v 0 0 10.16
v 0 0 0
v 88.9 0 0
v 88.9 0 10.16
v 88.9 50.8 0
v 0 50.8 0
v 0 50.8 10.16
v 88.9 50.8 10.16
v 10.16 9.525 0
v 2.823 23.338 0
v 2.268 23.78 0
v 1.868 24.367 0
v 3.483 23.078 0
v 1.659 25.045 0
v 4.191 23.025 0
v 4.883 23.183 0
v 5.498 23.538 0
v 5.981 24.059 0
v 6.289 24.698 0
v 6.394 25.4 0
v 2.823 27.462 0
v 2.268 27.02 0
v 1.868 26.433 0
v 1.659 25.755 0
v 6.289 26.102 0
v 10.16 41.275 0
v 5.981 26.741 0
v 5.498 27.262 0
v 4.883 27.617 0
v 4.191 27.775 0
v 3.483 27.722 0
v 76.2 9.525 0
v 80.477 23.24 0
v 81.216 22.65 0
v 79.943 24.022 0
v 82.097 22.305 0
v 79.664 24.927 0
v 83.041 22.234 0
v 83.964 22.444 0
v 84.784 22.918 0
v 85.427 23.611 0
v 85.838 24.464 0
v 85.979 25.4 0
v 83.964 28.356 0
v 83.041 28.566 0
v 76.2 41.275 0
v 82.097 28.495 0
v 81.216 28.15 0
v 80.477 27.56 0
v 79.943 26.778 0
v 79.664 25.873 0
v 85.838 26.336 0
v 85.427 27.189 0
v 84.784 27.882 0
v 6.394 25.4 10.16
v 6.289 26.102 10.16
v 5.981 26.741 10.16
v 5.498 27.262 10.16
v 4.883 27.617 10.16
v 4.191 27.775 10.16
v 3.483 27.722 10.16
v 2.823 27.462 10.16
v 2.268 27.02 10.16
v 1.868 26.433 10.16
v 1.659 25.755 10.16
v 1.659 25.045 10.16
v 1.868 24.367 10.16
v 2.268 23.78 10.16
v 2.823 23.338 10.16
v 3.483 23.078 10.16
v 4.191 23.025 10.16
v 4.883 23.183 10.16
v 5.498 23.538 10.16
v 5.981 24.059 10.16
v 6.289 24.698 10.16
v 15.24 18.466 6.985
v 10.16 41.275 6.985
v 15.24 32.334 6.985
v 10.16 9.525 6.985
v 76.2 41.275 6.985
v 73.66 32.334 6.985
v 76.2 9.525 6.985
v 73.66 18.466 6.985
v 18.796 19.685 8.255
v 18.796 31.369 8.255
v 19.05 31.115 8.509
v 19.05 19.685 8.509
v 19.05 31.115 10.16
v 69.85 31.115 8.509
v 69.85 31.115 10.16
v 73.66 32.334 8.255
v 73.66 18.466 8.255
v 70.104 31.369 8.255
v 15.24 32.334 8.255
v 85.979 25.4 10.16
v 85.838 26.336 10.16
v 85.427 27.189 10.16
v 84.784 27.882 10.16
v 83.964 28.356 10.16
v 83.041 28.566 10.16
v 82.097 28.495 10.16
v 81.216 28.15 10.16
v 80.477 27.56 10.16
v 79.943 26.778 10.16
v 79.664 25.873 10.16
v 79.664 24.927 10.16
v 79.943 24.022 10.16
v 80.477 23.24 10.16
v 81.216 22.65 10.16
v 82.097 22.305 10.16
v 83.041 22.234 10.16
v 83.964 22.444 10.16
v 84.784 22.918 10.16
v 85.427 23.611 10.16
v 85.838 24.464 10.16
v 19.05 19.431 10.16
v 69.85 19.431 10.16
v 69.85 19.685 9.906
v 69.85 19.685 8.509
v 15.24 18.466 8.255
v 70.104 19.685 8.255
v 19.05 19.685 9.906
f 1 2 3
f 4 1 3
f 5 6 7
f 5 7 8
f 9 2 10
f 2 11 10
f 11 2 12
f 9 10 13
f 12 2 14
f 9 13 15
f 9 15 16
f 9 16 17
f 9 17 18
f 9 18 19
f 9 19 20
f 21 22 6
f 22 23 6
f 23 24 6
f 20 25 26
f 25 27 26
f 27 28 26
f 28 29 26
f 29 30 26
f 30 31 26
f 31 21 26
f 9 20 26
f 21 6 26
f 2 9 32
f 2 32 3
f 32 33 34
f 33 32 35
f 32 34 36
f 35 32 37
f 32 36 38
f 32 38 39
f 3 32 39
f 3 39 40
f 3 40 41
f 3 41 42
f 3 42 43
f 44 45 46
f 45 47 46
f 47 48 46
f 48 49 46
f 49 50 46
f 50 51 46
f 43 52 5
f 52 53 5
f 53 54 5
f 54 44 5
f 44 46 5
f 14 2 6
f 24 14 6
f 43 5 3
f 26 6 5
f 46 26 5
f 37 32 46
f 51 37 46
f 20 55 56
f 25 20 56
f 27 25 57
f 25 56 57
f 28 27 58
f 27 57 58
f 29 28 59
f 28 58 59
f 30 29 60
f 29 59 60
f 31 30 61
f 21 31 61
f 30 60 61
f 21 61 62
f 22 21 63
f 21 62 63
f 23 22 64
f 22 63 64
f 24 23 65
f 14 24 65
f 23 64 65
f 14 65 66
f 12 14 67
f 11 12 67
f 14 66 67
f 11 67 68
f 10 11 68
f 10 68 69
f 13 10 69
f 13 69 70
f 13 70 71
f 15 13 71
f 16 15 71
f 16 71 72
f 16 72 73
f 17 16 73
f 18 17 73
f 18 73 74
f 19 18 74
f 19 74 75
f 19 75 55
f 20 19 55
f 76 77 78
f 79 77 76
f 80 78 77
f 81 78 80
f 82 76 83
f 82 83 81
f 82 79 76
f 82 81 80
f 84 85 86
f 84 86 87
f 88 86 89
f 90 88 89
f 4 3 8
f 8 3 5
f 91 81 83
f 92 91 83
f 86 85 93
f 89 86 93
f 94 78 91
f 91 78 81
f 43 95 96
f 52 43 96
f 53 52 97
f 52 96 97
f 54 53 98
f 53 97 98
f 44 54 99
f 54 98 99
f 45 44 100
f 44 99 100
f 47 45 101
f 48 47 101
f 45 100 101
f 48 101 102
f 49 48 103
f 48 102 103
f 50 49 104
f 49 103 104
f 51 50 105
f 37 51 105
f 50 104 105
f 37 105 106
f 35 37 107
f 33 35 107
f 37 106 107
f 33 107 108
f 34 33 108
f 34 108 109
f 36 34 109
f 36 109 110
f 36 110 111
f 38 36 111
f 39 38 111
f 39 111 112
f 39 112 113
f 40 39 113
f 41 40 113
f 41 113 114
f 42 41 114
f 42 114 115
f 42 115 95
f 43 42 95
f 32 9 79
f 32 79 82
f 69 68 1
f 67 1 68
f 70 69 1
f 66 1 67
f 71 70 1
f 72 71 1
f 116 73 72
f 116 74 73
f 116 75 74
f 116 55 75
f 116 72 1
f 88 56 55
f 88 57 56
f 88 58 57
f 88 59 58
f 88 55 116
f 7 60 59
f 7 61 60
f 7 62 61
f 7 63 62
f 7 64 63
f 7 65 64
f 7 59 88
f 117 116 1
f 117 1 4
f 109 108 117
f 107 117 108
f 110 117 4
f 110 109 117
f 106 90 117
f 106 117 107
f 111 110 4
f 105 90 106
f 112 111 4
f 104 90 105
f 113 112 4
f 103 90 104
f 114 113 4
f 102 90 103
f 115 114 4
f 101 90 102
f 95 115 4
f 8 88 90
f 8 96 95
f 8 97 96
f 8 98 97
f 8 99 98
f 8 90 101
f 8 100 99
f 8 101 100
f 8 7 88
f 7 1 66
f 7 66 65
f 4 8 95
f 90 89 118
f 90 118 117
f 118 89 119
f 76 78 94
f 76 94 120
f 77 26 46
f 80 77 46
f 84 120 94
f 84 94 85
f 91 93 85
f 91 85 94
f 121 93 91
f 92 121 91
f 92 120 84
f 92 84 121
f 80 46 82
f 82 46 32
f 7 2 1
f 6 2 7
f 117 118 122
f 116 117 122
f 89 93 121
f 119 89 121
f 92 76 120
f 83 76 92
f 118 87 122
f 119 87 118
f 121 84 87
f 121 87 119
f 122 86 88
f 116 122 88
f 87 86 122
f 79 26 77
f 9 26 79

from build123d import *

# Parameters (mm, degrees)
F0_W     = 88.9
F0_H     = 50.8
F1_DEPTH = 10.16
F2_R     = 2.38125
F2_R_2   = 3.175
F3_DEPTH = 25.4
F4_W     = 66.04
F4_H     = 31.75
F5_DEPTH = 6.985
F6_W     = 58.42
F6_H     = 13.8684
F7_DEPTH = 1.27
F8_W     = 50.8
F8_H     = 11.43
F9_DEPTH = 25.4
F10_SIZE = 0.254


with BuildPart() as f1:
    # F0 (on Top) → F1 (new body)
    with BuildSketch(Plane.XY):
        with Locations((44.45, 25.4)):
            Rectangle(F0_W, F0_H)
    extrude(amount=F1_DEPTH)

    # F2 (on face) → F3 (cut)
    with BuildSketch(Plane.XY.offset(10.16)):
        with Locations((4.0132, 25.4)):
            Circle(F2_R)
        with Locations((82.804, 25.4)):
            Circle(F2_R_2)
    extrude(amount=-F3_DEPTH, mode=Mode.SUBTRACT)

    # F4 (on face) → F5 (cut)
    with BuildSketch(Plane(origin=(0, 0, 0), x_dir=(1, 0, 0), z_dir=(0, 0, -1))):
        with Locations((43.18, -25.4)):
            Rectangle(F4_W, F4_H)
    extrude(amount=-F5_DEPTH, mode=Mode.SUBTRACT)

    # F6 (on face) → F7 (cut)
    with BuildSketch(Plane(origin=(0, 0, 6.985), x_dir=(1, 0, 0), z_dir=(0, 0, -1))):
        with Locations((44.45, -25.4)):
            Rectangle(F6_W, F6_H)
    extrude(amount=-F7_DEPTH, mode=Mode.SUBTRACT)

    # F8 (on face) → F9 (cut)
    with BuildSketch(Plane(origin=(0, 0, 8.255), x_dir=(1, 0, 0), z_dir=(0, 0, -1))):
        with Locations((44.45, -25.4)):
            Rectangle(F8_W, F8_H)
    extrude(amount=-F9_DEPTH, mode=Mode.SUBTRACT)

    # F10
    f10_edges = [f1.edges().sort_by_distance(p)[0] for p in [
        (44.45, 31.115, 8.255),
        (69.85, 25.4, 8.255),
        (44.45, 19.685, 10.16),
        (19.05, 25.4, 8.255),
    ]]
    chamfer(f10_edges, length=F10_SIZE)


solid = f1.part
